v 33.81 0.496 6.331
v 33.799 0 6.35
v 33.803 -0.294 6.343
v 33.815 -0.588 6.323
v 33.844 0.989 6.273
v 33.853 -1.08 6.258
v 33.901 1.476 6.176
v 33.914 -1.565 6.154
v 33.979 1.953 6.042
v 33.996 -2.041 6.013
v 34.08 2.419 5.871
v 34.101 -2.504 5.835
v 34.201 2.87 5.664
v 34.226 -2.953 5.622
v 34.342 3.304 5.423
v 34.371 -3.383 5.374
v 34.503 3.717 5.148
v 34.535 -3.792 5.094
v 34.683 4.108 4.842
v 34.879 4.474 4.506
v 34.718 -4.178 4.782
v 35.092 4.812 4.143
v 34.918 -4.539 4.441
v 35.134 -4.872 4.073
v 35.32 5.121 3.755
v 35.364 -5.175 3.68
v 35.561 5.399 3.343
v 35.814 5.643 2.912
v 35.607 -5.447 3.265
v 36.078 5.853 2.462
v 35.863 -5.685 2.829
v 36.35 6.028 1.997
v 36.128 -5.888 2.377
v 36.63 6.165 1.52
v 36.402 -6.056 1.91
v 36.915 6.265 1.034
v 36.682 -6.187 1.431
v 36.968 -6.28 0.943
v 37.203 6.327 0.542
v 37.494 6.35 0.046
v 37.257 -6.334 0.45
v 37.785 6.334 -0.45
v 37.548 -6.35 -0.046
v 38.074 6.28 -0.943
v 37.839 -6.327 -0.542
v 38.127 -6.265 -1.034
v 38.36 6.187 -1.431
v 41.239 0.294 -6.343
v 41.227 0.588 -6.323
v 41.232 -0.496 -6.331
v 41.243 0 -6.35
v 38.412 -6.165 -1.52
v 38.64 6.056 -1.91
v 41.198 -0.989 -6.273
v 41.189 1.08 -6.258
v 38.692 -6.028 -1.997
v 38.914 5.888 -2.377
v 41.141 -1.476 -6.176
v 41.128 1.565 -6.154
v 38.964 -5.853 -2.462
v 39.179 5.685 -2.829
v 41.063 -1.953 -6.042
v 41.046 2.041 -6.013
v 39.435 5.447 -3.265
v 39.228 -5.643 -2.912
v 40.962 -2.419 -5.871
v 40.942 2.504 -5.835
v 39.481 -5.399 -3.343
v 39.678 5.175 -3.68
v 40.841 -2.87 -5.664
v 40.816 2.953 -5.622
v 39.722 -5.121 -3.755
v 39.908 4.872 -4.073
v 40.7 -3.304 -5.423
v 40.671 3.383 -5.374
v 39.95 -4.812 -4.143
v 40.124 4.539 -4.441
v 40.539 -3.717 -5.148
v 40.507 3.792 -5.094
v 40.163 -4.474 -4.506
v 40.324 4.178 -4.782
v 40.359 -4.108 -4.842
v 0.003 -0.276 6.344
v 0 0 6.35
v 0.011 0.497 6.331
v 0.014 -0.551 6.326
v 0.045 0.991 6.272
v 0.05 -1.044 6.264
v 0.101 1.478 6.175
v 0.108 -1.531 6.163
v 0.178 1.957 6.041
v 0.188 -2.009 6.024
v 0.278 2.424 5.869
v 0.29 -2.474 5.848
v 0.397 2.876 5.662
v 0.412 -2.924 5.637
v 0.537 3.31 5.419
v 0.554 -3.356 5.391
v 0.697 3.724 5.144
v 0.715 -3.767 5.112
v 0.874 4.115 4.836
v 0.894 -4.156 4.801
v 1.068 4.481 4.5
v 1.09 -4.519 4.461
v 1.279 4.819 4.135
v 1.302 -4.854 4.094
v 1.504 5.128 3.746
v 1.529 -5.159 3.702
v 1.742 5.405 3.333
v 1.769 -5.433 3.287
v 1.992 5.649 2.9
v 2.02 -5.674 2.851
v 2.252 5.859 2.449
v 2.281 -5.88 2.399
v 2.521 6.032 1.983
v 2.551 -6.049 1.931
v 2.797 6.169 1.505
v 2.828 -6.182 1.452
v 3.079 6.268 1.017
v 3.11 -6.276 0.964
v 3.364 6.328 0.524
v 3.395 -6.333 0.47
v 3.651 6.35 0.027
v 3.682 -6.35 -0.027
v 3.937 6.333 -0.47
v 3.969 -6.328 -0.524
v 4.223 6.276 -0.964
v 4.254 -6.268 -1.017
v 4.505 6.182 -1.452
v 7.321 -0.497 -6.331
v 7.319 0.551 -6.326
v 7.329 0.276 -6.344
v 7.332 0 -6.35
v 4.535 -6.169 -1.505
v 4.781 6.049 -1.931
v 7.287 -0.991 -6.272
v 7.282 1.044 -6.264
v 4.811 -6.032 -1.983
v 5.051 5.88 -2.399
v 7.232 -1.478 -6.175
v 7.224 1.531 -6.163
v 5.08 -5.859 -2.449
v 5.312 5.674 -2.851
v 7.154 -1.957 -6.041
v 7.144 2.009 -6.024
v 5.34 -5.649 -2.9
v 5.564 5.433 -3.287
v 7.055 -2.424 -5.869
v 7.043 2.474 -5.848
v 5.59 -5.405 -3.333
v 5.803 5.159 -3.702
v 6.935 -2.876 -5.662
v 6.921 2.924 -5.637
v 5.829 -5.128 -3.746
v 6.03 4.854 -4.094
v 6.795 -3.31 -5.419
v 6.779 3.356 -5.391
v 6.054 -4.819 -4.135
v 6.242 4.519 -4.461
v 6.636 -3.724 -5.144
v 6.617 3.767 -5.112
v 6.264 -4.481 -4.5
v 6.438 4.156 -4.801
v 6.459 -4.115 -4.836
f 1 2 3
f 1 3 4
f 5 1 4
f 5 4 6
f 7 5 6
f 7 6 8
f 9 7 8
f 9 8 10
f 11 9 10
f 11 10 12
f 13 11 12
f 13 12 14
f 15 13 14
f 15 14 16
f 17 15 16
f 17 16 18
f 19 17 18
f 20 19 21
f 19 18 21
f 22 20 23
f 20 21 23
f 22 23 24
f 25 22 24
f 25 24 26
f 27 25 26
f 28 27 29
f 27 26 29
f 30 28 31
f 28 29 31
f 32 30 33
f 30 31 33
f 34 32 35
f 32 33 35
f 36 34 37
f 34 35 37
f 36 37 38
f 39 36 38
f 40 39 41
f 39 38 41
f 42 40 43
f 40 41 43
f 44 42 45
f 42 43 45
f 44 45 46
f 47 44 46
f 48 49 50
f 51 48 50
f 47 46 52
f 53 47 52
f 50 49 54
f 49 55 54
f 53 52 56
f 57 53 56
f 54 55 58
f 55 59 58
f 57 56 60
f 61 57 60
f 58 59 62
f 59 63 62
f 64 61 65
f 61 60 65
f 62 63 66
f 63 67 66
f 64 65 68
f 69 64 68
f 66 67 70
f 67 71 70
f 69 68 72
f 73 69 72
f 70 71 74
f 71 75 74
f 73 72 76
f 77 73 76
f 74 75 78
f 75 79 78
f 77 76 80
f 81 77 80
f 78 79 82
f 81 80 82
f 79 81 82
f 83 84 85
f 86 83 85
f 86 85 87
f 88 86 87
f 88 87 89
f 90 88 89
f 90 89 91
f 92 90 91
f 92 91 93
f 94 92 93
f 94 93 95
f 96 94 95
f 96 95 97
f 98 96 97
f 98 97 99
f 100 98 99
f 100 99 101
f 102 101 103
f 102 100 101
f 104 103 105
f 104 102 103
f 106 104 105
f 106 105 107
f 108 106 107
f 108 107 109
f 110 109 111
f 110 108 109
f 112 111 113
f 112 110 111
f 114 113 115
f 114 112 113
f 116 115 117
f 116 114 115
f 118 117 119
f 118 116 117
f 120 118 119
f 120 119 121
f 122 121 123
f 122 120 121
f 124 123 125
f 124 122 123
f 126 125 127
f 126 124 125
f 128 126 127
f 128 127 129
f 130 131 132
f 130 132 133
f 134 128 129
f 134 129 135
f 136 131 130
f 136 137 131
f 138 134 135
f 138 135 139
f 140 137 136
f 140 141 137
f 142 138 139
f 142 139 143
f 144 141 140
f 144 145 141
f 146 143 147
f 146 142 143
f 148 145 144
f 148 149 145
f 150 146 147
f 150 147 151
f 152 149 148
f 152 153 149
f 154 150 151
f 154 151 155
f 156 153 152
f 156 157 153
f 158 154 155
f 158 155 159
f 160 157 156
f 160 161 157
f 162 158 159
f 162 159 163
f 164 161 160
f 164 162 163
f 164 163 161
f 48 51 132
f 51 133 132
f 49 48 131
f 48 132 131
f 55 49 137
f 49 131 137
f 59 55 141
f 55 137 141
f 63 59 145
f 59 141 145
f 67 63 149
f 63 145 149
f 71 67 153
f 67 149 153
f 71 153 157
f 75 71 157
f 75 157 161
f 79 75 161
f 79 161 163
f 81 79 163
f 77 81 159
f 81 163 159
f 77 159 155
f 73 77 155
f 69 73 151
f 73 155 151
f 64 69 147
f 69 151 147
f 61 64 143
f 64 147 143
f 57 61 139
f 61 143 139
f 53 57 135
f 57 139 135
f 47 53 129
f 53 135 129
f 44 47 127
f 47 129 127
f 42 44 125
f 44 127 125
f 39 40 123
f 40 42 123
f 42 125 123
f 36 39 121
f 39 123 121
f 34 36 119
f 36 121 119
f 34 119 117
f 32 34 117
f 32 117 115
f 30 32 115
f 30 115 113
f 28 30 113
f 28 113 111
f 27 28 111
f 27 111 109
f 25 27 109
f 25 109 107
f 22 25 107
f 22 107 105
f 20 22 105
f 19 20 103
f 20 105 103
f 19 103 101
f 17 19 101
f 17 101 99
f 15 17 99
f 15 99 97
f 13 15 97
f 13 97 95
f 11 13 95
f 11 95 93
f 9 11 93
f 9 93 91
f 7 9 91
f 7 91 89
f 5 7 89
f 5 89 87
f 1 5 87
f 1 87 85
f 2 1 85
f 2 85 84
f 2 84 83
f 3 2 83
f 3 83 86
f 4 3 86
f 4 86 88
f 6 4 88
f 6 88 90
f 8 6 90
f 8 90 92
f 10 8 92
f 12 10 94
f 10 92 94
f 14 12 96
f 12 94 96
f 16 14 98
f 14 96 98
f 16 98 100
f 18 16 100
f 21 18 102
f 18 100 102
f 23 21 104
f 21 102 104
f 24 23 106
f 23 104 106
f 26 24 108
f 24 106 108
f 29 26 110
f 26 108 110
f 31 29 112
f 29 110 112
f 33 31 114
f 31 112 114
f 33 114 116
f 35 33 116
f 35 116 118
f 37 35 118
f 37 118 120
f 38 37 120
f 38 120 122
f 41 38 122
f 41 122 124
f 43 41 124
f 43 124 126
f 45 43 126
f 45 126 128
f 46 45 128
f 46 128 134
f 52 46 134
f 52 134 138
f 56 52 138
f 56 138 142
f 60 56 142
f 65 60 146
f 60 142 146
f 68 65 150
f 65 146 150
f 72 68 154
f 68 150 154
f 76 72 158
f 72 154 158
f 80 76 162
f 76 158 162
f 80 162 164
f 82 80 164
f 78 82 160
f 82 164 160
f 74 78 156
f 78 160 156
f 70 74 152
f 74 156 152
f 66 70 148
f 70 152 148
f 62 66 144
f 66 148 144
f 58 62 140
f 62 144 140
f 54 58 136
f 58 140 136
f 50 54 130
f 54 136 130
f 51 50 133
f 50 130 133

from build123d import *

# Parameters (mm, degrees)
SKETCH1_R               = 6.35
BOSS_EXTRUDE1_DEPTH     = 51.308
CUT_EXTRUDE1_DEPTH      = 53.087962755
CUT_EXTRUDE1_DEPTH_BACK = 53.087962755
CUT_EXTRUDE2_DEPTH      = 53.087962755
CUT_EXTRUDE2_DEPTH_BACK = 53.087962755


with BuildPart() as part:
    # Sketch1 → Boss-Extrude1 (new body)
    with BuildSketch(Plane(origin=(0, 0, 0), x_dir=(0, 0, -1), z_dir=(1, 0, 0))):
        Circle(SKETCH1_R)
    extrude(amount=BOSS_EXTRUDE1_DEPTH)

    # Sketch2 → Cut-Extrude1 (cut, two sides: drawn at the far end of the back side and taken through both)
    with BuildSketch(Plane(origin=(0, 0, 0), x_dir=(1, 0, 0), z_dir=(0, 1, 0)).offset(-CUT_EXTRUDE1_DEPTH_BACK)):
        Polygon((0, -6.35), (7.332348419, 6.35), (0, 6.35), align=None)
    extrude(amount=CUT_EXTRUDE1_DEPTH + CUT_EXTRUDE1_DEPTH_BACK, mode=Mode.SUBTRACT)

    # Sketch3 → Cut-Extrude2 (cut, two sides: drawn at the far end of the back side and taken through both)
    with BuildSketch(Plane(origin=(0, 0, 0), x_dir=(1, 0, 0), z_dir=(0, 1, 0)).offset(-CUT_EXTRUDE2_DEPTH_BACK)):
        Polygon((33.798828355, -6.35), (41.24323005, 6.35), (51.308, 6.35), (51.308, -6.35), align=None)
    extrude(amount=CUT_EXTRUDE2_DEPTH + CUT_EXTRUDE2_DEPTH_BACK, mode=Mode.SUBTRACT)


solid = part.part
